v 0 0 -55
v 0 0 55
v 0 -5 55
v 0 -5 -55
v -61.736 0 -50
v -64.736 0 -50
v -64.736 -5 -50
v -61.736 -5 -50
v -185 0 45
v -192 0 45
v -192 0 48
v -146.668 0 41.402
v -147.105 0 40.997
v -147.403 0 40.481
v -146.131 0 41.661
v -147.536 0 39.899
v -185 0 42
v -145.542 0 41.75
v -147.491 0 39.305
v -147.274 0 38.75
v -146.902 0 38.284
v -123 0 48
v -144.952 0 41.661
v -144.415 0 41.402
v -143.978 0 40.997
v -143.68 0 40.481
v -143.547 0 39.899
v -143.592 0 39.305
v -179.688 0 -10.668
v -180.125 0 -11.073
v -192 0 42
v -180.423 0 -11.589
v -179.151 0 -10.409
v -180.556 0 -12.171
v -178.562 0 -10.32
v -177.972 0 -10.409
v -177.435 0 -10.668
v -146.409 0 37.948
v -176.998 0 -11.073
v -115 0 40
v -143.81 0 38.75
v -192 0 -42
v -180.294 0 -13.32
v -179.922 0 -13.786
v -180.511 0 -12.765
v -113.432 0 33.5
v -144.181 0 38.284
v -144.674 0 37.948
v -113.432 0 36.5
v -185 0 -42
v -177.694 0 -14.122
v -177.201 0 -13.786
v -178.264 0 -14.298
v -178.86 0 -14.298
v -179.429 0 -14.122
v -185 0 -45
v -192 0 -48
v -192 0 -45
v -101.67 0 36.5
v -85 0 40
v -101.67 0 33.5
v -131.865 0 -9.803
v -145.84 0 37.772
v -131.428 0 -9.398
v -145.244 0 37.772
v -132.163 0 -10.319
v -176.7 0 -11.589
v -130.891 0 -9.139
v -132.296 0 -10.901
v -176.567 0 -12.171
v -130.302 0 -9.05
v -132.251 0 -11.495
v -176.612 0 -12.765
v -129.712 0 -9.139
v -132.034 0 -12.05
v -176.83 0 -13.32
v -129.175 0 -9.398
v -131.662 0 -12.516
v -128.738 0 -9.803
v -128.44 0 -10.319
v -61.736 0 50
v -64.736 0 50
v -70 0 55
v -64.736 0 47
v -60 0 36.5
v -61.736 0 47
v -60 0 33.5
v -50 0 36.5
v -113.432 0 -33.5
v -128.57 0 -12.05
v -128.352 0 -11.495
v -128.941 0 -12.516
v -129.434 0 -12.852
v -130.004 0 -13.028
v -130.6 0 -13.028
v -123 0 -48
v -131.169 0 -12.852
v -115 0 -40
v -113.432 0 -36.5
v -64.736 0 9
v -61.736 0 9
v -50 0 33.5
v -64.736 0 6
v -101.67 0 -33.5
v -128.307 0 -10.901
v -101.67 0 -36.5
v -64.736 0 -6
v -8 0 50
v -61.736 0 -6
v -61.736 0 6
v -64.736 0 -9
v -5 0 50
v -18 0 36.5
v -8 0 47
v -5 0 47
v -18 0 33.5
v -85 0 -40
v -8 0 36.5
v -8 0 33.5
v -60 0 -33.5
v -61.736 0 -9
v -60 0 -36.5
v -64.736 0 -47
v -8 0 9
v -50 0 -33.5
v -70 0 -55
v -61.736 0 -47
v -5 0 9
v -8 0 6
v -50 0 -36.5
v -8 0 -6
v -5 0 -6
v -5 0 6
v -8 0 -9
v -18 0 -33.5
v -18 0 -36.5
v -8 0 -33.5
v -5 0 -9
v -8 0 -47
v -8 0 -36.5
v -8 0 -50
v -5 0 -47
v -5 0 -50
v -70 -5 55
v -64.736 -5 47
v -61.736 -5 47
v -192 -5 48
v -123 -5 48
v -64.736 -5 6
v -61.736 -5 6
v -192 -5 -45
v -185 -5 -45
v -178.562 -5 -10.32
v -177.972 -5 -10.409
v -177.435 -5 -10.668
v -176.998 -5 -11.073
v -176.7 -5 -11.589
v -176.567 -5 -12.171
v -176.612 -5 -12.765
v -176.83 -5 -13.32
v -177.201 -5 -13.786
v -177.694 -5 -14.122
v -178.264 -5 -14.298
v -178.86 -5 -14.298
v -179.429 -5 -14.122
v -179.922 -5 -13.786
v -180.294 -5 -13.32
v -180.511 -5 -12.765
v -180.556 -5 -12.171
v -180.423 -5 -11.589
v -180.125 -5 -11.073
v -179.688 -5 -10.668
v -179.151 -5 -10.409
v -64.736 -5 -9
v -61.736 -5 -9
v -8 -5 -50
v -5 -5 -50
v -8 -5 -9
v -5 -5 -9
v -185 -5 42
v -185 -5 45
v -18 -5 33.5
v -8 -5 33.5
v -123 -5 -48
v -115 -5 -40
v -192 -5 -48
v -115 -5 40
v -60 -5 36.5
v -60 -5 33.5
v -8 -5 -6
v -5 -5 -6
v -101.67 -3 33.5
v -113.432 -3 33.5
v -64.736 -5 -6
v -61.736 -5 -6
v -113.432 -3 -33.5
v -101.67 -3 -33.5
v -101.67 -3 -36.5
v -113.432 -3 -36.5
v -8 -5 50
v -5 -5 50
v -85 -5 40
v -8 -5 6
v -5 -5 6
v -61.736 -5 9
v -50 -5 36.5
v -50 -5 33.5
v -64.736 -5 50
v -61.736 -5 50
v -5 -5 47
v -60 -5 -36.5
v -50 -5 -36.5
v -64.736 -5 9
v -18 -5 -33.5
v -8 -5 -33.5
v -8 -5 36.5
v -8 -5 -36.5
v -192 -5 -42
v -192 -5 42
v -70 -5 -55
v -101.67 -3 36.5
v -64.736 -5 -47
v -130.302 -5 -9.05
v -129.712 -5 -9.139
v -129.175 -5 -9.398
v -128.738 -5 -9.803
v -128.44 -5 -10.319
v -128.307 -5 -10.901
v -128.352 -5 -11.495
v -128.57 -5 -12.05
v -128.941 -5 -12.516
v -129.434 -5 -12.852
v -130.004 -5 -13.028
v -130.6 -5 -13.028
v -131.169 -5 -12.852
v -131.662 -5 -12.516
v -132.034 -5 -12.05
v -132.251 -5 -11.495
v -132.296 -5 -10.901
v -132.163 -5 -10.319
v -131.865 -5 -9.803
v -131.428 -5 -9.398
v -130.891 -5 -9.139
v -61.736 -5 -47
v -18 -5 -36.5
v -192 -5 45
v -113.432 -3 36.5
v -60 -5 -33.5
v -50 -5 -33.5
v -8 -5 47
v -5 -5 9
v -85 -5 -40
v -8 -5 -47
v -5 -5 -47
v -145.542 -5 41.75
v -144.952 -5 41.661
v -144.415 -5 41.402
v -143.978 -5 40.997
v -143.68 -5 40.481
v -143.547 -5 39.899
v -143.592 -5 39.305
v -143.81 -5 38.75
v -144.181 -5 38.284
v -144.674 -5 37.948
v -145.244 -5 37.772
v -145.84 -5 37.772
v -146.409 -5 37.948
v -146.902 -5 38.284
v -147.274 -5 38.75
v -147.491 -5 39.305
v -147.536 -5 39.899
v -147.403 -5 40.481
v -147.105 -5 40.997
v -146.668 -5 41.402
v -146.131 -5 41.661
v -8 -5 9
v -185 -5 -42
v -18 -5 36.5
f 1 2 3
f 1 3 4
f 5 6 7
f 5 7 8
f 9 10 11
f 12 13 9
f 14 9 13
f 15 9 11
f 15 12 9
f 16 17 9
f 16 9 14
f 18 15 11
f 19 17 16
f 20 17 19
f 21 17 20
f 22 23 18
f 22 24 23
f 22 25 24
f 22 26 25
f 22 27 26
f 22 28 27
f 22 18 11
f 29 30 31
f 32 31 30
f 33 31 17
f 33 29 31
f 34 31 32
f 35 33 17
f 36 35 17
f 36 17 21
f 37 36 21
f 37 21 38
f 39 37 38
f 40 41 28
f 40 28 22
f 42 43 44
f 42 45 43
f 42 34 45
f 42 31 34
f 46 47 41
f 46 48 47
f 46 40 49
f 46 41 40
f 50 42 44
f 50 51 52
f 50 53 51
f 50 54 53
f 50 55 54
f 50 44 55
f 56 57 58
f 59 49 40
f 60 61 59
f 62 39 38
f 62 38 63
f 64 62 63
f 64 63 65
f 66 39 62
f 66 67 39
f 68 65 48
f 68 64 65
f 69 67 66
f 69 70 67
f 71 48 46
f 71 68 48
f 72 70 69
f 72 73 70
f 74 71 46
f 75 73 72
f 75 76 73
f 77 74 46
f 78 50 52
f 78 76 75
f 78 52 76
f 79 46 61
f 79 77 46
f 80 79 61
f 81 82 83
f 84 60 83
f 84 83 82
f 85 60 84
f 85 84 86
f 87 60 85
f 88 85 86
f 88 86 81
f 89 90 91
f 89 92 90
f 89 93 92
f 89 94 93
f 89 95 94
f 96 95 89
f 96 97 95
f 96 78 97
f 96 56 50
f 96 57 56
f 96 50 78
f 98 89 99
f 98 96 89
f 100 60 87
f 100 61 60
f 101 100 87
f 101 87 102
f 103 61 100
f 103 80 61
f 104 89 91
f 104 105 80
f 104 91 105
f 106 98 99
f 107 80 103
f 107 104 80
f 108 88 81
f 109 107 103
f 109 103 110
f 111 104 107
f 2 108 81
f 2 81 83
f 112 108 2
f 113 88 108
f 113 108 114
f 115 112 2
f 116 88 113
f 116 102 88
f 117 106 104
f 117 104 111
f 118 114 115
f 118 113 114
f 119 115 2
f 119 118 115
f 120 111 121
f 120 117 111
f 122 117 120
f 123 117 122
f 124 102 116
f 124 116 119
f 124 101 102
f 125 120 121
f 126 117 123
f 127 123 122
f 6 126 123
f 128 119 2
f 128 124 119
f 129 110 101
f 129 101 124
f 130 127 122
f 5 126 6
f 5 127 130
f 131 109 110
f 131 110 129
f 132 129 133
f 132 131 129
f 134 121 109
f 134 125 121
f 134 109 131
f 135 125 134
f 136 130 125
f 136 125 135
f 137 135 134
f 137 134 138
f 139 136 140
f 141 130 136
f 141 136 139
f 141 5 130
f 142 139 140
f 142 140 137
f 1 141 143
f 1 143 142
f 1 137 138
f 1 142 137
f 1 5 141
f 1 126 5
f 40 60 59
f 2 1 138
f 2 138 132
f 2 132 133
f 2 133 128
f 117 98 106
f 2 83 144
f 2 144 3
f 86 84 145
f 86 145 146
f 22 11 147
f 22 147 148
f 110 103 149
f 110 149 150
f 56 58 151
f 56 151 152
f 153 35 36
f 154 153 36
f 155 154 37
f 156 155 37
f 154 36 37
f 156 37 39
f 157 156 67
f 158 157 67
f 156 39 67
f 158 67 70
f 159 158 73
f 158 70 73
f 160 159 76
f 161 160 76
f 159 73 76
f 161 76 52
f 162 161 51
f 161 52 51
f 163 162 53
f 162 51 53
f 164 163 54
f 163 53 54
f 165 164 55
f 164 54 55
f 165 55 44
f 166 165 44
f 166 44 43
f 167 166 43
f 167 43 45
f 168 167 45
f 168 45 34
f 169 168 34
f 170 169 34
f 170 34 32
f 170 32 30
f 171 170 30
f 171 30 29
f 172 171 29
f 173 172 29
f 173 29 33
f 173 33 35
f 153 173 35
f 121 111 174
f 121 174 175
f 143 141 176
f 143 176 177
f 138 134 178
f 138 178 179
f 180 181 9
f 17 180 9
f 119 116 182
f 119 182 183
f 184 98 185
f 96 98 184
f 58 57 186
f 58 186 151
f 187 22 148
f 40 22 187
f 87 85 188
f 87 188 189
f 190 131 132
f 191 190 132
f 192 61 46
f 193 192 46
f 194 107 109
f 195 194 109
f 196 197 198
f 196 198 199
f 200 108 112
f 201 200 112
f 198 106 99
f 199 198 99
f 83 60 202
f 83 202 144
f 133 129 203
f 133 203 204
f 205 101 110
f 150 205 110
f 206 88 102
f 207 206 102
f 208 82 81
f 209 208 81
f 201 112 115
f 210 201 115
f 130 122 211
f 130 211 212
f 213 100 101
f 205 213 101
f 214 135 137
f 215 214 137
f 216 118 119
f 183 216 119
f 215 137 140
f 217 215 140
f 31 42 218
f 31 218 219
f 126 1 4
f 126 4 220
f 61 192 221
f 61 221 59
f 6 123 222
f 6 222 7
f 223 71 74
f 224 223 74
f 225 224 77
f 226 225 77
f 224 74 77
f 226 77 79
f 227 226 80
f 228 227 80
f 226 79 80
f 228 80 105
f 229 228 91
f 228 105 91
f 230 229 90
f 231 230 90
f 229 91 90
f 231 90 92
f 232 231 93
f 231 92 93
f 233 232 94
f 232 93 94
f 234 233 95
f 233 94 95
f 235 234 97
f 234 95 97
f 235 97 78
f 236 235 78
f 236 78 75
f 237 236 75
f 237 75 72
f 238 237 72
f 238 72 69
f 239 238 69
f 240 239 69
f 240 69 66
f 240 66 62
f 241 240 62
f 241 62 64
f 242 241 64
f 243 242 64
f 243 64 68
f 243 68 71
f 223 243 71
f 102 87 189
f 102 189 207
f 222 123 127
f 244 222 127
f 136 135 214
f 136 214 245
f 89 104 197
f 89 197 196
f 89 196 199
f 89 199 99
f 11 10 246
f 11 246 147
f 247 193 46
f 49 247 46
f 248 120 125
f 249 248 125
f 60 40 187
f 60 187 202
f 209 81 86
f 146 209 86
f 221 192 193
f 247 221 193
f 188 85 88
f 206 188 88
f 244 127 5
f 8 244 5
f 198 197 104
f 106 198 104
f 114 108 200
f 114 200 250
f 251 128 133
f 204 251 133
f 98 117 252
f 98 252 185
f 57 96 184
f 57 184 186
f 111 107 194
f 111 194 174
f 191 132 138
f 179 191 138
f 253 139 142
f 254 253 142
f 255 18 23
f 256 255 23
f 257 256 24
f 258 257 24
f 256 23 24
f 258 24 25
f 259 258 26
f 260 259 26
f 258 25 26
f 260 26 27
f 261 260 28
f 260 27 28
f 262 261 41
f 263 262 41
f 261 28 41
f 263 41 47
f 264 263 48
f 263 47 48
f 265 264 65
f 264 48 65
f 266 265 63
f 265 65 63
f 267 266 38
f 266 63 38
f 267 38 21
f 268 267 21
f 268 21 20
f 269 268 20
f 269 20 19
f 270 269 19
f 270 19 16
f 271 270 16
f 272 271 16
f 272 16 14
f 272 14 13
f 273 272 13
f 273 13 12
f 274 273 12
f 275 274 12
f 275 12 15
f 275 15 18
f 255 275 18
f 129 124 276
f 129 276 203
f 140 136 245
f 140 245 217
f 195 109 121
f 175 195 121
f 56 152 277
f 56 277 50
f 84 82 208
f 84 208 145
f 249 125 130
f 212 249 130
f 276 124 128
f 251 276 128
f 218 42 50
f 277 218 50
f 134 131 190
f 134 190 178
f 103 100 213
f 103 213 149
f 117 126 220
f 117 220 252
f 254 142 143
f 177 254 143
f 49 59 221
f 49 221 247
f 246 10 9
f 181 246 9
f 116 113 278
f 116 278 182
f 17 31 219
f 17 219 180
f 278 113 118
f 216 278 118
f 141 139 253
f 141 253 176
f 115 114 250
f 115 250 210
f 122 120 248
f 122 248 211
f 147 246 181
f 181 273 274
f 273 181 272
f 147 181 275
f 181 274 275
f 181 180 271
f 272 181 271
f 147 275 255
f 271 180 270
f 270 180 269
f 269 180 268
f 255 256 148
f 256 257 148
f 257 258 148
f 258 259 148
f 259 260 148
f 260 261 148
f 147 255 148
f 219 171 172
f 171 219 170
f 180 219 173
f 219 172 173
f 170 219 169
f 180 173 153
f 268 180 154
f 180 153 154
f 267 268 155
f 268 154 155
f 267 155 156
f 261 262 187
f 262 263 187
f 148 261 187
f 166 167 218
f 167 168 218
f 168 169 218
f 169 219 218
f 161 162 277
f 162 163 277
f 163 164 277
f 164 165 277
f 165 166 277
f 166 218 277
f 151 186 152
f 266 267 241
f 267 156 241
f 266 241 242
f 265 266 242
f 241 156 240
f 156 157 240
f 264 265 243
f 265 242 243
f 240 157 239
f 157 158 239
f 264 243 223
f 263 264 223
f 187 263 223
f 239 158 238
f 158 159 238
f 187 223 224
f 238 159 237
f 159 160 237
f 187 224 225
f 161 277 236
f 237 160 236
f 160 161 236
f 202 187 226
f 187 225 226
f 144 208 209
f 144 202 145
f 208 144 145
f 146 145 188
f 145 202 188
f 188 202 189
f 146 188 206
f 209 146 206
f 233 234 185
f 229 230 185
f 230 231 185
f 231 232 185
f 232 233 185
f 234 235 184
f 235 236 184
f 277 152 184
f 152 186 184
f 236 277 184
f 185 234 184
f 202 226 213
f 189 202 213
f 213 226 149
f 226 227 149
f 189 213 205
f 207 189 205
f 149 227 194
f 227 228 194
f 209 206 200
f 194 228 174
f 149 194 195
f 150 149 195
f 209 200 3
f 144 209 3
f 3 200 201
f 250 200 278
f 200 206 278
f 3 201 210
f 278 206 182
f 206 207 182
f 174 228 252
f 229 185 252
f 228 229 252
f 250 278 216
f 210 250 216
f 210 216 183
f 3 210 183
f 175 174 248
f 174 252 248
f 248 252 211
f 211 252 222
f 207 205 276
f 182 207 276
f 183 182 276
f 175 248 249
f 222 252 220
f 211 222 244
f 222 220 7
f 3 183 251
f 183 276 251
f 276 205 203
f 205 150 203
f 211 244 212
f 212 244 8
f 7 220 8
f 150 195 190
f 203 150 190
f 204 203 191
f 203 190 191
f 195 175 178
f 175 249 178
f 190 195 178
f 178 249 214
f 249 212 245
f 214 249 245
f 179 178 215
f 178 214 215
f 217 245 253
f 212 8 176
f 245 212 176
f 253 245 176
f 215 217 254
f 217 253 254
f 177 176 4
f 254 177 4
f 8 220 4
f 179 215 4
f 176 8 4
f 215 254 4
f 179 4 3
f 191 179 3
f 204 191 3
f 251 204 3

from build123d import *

# Parameters (mm, degrees)
BOSS_EXTRUDE1_DEPTH  = 5
SKETCH10_W           = 3
SKETCH10_H           = 3
CUT_EXTRUDE3_DEPTH   = 10
SKETCH11_W           = 10
SKETCH11_H           = 3
CUT_EXTRUDE4_DEPTH   = 10
BOSS_EXTRUDE5_DEPTH  = 3
SKETCH13_R           = 2
BOSS_EXTRUDE6_DEPTH  = 3
SKETCH14_R           = 2
SKETCH14_W           = 7
SKETCH14_H           = 3
BOSS_EXTRUDE7_DEPTH  = 3
SKETCH15_W           = 11.761480784
SKETCH15_H           = 3
BOSS_EXTRUDE8_DEPTH  = 3
SKETCH15_3_W         = 11.761480784
SKETCH15_3_H         = 3
CUT_EXTRUDE6_DEPTH   = 3
CUT_EXTRUDE7_DEPTH   = 63
BOSS_EXTRUDE9_DEPTH  = 3
BOSS_EXTRUDE10_DEPTH = 5
SKETCH19_R           = 2
CUT_EXTRUDE8_DEPTH   = 10
SKETCH24_R           = 1.75
CUT_EXTRUDE12_DEPTH  = 3
BOSS_EXTRUDE12_DEPTH = 3
CUT_EXTRUDE13_DEPTH  = 3
SKETCH27_R           = 2
CUT_EXTRUDE14_DEPTH  = 3
SKETCH29_W           = 25
SKETCH29_H           = 120
BOSS_EXTRUDE13_DEPTH = 1.4
SKETCH30_R           = 2
CUT_EXTRUDE15_DEPTH  = 30.4


with BuildPart() as part:
    # Sketch1 → Boss-Extrude1 (new body)
    with BuildSketch(Plane(origin=(0, 0, 0), x_dir=(1, 0, 0), z_dir=(0, 1, 0))):
        Polygon((-70, -55), (0, -55), (0, 55), (-70, 55), (-85, 40), (-210, 40), (-250, 0), (-210, -40), (-85, -40), align=None)
    extrude(amount=-BOSS_EXTRUDE1_DEPTH)

    # Sketch10 → Cut-Extrude3 (cut)
    with BuildSketch(Plane(origin=(0, 0, 0), x_dir=(1, 0, 0), z_dir=(0, 1, 0))):
        with Locations((-63.236231, -7.5)):
            Rectangle(SKETCH10_W, SKETCH10_H)
        with Locations((-63.236231, -48.5)):
            Rectangle(SKETCH10_W, SKETCH10_H)
        with Locations((-6.5, -48.5)):
            Rectangle(SKETCH10_W, SKETCH10_H)
        with Locations((-6.5, -7.5)):
            Rectangle(SKETCH10_W, SKETCH10_H)
        with Locations((-6.5, 7.5)):
            Rectangle(SKETCH10_W, SKETCH10_H)
        with Locations((-6.5, 48.5)):
            Rectangle(SKETCH10_W, SKETCH10_H)
        with Locations((-63.236231, 48.5)):
            Rectangle(SKETCH10_W, SKETCH10_H)
        with Locations((-63.236231, 7.5)):
            Rectangle(SKETCH10_W, SKETCH10_H)
    extrude(amount=-CUT_EXTRUDE3_DEPTH, mode=Mode.SUBTRACT)

    # Sketch11 → Cut-Extrude4 (cut)
    with BuildSketch(Plane(origin=(0, 0, 0), x_dir=(1, 0, 0), z_dir=(0, 1, 0))):
        with Locations((-13, -35)):
            Rectangle(SKETCH11_W, SKETCH11_H)
        with Locations((-13, 35)):
            Rectangle(SKETCH11_W, SKETCH11_H)
        with Locations((-55, 35)):
            Rectangle(SKETCH11_W, SKETCH11_H)
        with Locations((-55, -35)):
            Rectangle(SKETCH11_W, SKETCH11_H)
    extrude(amount=-CUT_EXTRUDE4_DEPTH, mode=Mode.SUBTRACT)

    # Sketch15<3> → Cut-Extrude6 (cut)
    # profile 1 of 2: a face of its own
    with BuildSketch(Plane(origin=(0, 0, -33.5), x_dir=(-1, 0, 0), z_dir=(0, 0, -1))):
        Polygon((97.670134296, 0), (117.43161508, 0), (117.43161508, 17.663270368), (97.670134296, 22.958343186), align=None)
        Polygon((112.655157945, 10.660908757), (113.43161508, 13.558686236), (106.670134296, 15.370419552), (100.874579339, 16.923333822), (100.098122203, 14.025556343), (105.893677161, 12.472642073), align=None, mode=Mode.SUBTRACT)
    # profile 2 of 2: a face of its own
    with BuildSketch(Plane(origin=(0, 0, -33.5), x_dir=(-1, 0, 0), z_dir=(0, 0, -1))):
        with Locations((107.550874688, -1.5)):
            Rectangle(SKETCH15_3_W, SKETCH15_3_H)
    cut_extrude6 = extrude(amount=CUT_EXTRUDE6_DEPTH, mode=Mode.SUBTRACT)

    # Mirror5: Cut-Extrude6 across plane
    add(cut_extrude6.mirror(Plane.XY), mode=Mode.SUBTRACT)

    # Sketch17 → Cut-Extrude7 (cut)
    with BuildSketch(Plane(origin=(0, 0, 0), x_dir=(1, 0, 0), z_dir=(0, 1, 0))):
        Polygon((-192, -40), (-192, 40), (-210, 40), (-250, 0), (-210, -40), align=None)
    extrude(amount=-CUT_EXTRUDE7_DEPTH, mode=Mode.SUBTRACT)

    # Sketch20 → Boss-Extrude10 (add)
    with BuildSketch(Plane(origin=(0, 0, 0), x_dir=(1, 0, 0), z_dir=(0, 1, 0))):
        Polygon((-115, -40), (-192, -40), (-192, -48), (-123, -48), align=None)
        Polygon((-192, 48), (-192, 40), (-115, 40), (-123, 48), align=None)
    extrude(amount=-BOSS_EXTRUDE10_DEPTH)

    # Sketch19 → Cut-Extrude8 (cut)
    with BuildSketch(Plane(origin=(0, 0, 0), x_dir=(1, 0, 0), z_dir=(0, 1, 0))):
        with Locations(Location((-130.301621673, 11.049999775, 0), (0, 0, 270))):
            Circle(SKETCH19_R)
        with Locations(Location((-178.561621814, 12.319994418, 0), (0, 0, 270))):
            Circle(SKETCH19_R)
        with Locations(Location((-145.541616034, -39.750001917, 0), (0, 0, 270))):
            Circle(SKETCH19_R)
    extrude(amount=-CUT_EXTRUDE8_DEPTH, mode=Mode.SUBTRACT)


with BuildPart() as body_2:
    # Sketch12 → Boss-Extrude5 (new body)
    with BuildSketch(Plane.XY.offset(-36.5)):
        Polygon((-67, 0), (-2, 0), (3.967923412, 30), (15.016198358, 63.505316822), (-12, 56.26634829), (-67, 29.176380902), align=None)
        Polygon((-4.577717242, 39.620171714), (-5.354174377, 42.517949192), (1.407306407, 44.329682508), (2.183763542, 41.431905029), align=None, mode=Mode.SUBTRACT)
    extrude(amount=BOSS_EXTRUDE5_DEPTH)


with BuildPart() as body_3:
    # Mirror3: mirrored copy
    add(body_2.part.mirror(Plane.XY))


with BuildPart() as body_4:
    # Sketch13 → Boss-Extrude6 (new body)
    with BuildSketch(Plane(origin=(-10.211691838, 38.11055277, 0), x_dir=(0.9659258262890699, 0.25881904510251513, 0), z_dir=(-0.25881904510251513, 0.9659258262890699, 0))):
        Polygon((12.8327197, 33.5), (12.8327197, 36.5), (5.8327197, 36.5), (5.8327197, 33.5), (4.8327197, 33.5), (4.8327197, -33.5), (5.8327197, -33.5), (5.8327197, -36.5), (12.8327197, -36.5), (12.8327197, -33.5), (18.8327197, -33.5), (18.8327197, 33.5), align=None)
        with Locations((13.8327197, -25.24)):
            Circle(SKETCH13_R, mode=Mode.SUBTRACT)
        with Locations((13.8327197, 25.24)):
            Circle(SKETCH13_R, mode=Mode.SUBTRACT)
    extrude(amount=BOSS_EXTRUDE6_DEPTH)


with BuildPart() as body_5:
    # Sketch14 → Boss-Extrude7 (new body)
    # profile 1 of 4: a face of its own
    with BuildSketch(Plane(origin=(-10.988148973, 41.008330249, 0), x_dir=(0.9659258262890699, 0.2588190451025152, 0), z_dir=(-0.2588190451025152, 0.9659258262890699, 0))):
        Polygon((-106.0572803, 33.5), (-107.0572803, 33.5), (-107.0572803, 0), (-93.0572803, 0), (-93.0572803, 33.5), (-99.0572803, 33.5), align=None)
        with Locations(Location((-102.0572803, 25.24, 0), (0, 0, 180))):
            Circle(SKETCH14_R, mode=Mode.SUBTRACT)
    # profile 2 of 4: a face of its own
    with BuildSketch(Plane(origin=(-10.988148973, 41.008330249, 0), x_dir=(0.9659258262890699, 0.2588190451025152, 0), z_dir=(-0.2588190451025152, 0.9659258262890699, 0))):
        with Locations((-102.5572803, 35)):
            Rectangle(SKETCH14_W, SKETCH14_H)
    # profile 3 of 4: a face of its own
    with BuildSketch(Plane(origin=(-10.988148973, 41.008330249, 0), x_dir=(0.9659258262890699, 0.2588190451025152, 0), z_dir=(-0.2588190451025152, 0.9659258262890699, 0))):
        Polygon((-93.0572803, 0), (-107.0572803, 0), (-107.0572803, -33.5), (-106.0572803, -33.5), (-99.0572803, -33.5), (-93.0572803, -33.5), align=None)
        with Locations(Location((-102.0572803, -25.24, 0), (0, 0, 180))):
            Circle(SKETCH14_R, mode=Mode.SUBTRACT)
    # profile 4 of 4: a face of its own
    with BuildSketch(Plane(origin=(-10.988148973, 41.008330249, 0), x_dir=(0.9659258262890699, 0.2588190451025152, 0), z_dir=(-0.2588190451025152, 0.9659258262890699, 0))):
        with Locations((-102.5572803, -35)):
            Rectangle(SKETCH14_W, SKETCH14_H)
    extrude(amount=-BOSS_EXTRUDE7_DEPTH)


with BuildPart() as body_6:
    # Sketch15 → Boss-Extrude8 (new body)
    # profile 1 of 3: a face of its own
    with BuildSketch(Plane(origin=(0, 0, -33.5), x_dir=(-1, 0, 0), z_dir=(0, 0, -1))):
        Polygon((97.670134296, 0), (117.43161508, 0), (117.43161508, 17.663270368), (97.670134296, 22.958343186), align=None)
        Polygon((112.655157945, 10.660908757), (113.43161508, 13.558686236), (106.670134296, 15.370419552), (100.874579339, 16.923333822), (100.098122203, 14.025556343), (105.893677161, 12.472642073), align=None, mode=Mode.SUBTRACT)
    # profile 2 of 3: a face of its own
    with BuildSketch(Plane(origin=(0, 0, -33.5), x_dir=(-1, 0, 0), z_dir=(0, 0, -1))):
        with Locations((107.550874688, -1.5)):
            Rectangle(SKETCH15_W, SKETCH15_H)
    # profile 3 of 3: a face of its own
    with BuildSketch(Plane(origin=(0, 0, -33.5), x_dir=(-1, 0, 0), z_dir=(0, 0, -1))):
        Polygon((105.893677161, 12.472642073), (106.670134296, 15.370419552), (100.874579339, 16.923333822), (100.098122203, 14.025556343), align=None)
    extrude(amount=BOSS_EXTRUDE8_DEPTH)


with BuildPart() as body_7:
    # Mirror4: mirrored copy
    add(body_6.part.mirror(Plane.XY))


with BuildPart() as body_8:
    # Sketch18 → Boss-Extrude9 (new body)
    with BuildSketch(Plane(origin=(-12.861561237, -48, 0), x_dir=(0, 0, 1), z_dir=(-0.25881904510252135, -0.9659258262890681, 0))):
        Polygon((48, 185.957758648), (-48, 185.957758648), (-48, 215.180976351), (0, 255.457758648), (48, 215.180976351), align=None)
    extrude(amount=BOSS_EXTRUDE9_DEPTH)

    # Sketch24 → Cut-Extrude12 (cut)
    with BuildSketch(Plane(origin=(-12.861561237, -48, 0), x_dir=(0.9659258262890682, -0.25881904510252135, 0), z_dir=(0.2588190451025213, 0.9659258262890681, 0))):
        with Locations(Location((-200.957758648, -13.875, 0), (0, 0, 180))):
            Circle(SKETCH24_R)
        with Locations(Location((-200.957758648, 13.875, 0), (0, 0, 180))):
            Circle(SKETCH24_R)
    extrude(amount=-CUT_EXTRUDE12_DEPTH, mode=Mode.SUBTRACT)


with BuildPart() as body_9:
    # Sketch26 → Boss-Extrude12 (new body)
    with BuildSketch(Plane.XY.offset(45)):
        Polygon((-172, 3), (-183.927615219, 13.636723728), (-191.439047106, 0), (-185, 0), (-172, 0), align=None)
        Polygon((-210.806452543, 8.145002313), (-211.582909679, 5.247224834), (-199.244443697, 1.941142838), (-192.482962913, 0.129409523), (-193.259420048, -2.768367956), (-200.020900832, -0.956634641), (-212.359366814, 2.349447355), (-213.135823949, -0.548330124), (-196.881901916, -9.881299392), (-192, -1.018389004), (-192, 0), (-191.439047106, 0), (-183.927615219, 13.636723728), align=None)
        Polygon((-192, -1.018389004), (-196.881901916, -9.881299392), (-172, -8), (-172, -5), (-185, -5), (-192, -5), align=None)
        Polygon((-185, 0), (-191.439047106, 0), (-192, -1.018389004), (-192, -5), (-185, -5), align=None)
        Polygon((-192.482962913, 0.129409523), (-199.244443697, 1.941142838), (-200.020900832, -0.956634641), (-193.259420048, -2.768367956), align=None)
        Polygon((-192, -1.018389004), (-191.439047106, 0), (-192, 0), align=None)
    extrude(amount=-BOSS_EXTRUDE12_DEPTH)


with BuildPart() as cut_extrude13_tool:
    # Sketch26<3> → Cut-Extrude13 (new body)
    with BuildSketch(Plane.XY.offset(45)):
        Polygon((-192.482962913, 0.129409523), (-199.244443697, 1.941142838), (-200.020900832, -0.956634641), (-193.259420048, -2.768367956), align=None)
        Polygon((-185, 0), (-191.439047106, 0), (-192, -1.018389004), (-192, -5), (-185, -5), align=None)
        Polygon((-192, -1.018389004), (-191.439047106, 0), (-192, 0), align=None)
    cut_extrude13 = extrude(amount=-CUT_EXTRUDE13_DEPTH)


with BuildPart() as body_8_1:
    add(body_8.part)

    # Cut-Extrude13: cut by cut_extrude13_tool
    add(cut_extrude13_tool.part, mode=Mode.SUBTRACT)


with BuildPart() as part_1:
    add(part.part)

    # Cut-Extrude13: cut by cut_extrude13_tool
    add(cut_extrude13_tool.part, mode=Mode.SUBTRACT)


with BuildPart() as body_10:
    # Mirror7: mirrored copy
    add(body_9.part.mirror(Plane.XY))


with BuildPart() as mirror8_tool:
    # Mirror8: Cut-Extrude13 across plane
    add(cut_extrude13.mirror(Plane.XY))


with BuildPart() as body_8_2:
    add(body_8_1.part)

    # Mirror8: cut by mirror8_tool
    add(mirror8_tool.part, mode=Mode.SUBTRACT)

    # Sketch27 → Cut-Extrude14 (cut)
    with BuildSketch(Plane(origin=(-12.861561237, -48, 0), x_dir=(0.9659258262890681, -0.25881904510252146, 0), z_dir=(0.25881904510252146, 0.9659258262890681, 0))):
        with Locations(Location((-220.731478581, 30.495102239, 0), (0, 0, 180))):
            Circle(SKETCH27_R)
        with Locations(Location((-220.731478581, -30.495102239, 0), (0, 0, 180))):
            Circle(SKETCH27_R)
    extrude(amount=-CUT_EXTRUDE14_DEPTH, mode=Mode.SUBTRACT)


with BuildPart() as part_2:
    add(part_1.part)

    # Mirror8: cut by mirror8_tool
    add(mirror8_tool.part, mode=Mode.SUBTRACT)


with BuildPart() as body_11:
    # Sketch29 → Boss-Extrude13 (new body)
    with BuildSketch(Plane(origin=(-16.226208823, -60.557035742, 0), x_dir=(-0.9659258262890681, 0.25881904510252146, 0), z_dir=(-0.25881904510252146, -0.9659258262890681, 0))):
        with Locations((228.231478581, 0)):
            Rectangle(SKETCH29_W, SKETCH29_H)
    extrude(amount=BOSS_EXTRUDE13_DEPTH)

    # Sketch30 → Cut-Extrude15 (cut)
    with BuildSketch(Plane(origin=(-16.226208823, -60.557035742, 0), x_dir=(0.9659258262890681, -0.2588190451025215, 0), z_dir=(0.2588190451025215, 0.9659258262890681, 0))):
        with Locations(Location((-220.731478581, 30.495102239, 0), (0, 0, 180))):
            Circle(SKETCH30_R)
        with Locations(Location((-220.731478581, -30.495102239, 0), (0, 0, 180))):
            Circle(SKETCH30_R)
    extrude(amount=-CUT_EXTRUDE15_DEPTH, mode=Mode.SUBTRACT)


solid = part_2.part
